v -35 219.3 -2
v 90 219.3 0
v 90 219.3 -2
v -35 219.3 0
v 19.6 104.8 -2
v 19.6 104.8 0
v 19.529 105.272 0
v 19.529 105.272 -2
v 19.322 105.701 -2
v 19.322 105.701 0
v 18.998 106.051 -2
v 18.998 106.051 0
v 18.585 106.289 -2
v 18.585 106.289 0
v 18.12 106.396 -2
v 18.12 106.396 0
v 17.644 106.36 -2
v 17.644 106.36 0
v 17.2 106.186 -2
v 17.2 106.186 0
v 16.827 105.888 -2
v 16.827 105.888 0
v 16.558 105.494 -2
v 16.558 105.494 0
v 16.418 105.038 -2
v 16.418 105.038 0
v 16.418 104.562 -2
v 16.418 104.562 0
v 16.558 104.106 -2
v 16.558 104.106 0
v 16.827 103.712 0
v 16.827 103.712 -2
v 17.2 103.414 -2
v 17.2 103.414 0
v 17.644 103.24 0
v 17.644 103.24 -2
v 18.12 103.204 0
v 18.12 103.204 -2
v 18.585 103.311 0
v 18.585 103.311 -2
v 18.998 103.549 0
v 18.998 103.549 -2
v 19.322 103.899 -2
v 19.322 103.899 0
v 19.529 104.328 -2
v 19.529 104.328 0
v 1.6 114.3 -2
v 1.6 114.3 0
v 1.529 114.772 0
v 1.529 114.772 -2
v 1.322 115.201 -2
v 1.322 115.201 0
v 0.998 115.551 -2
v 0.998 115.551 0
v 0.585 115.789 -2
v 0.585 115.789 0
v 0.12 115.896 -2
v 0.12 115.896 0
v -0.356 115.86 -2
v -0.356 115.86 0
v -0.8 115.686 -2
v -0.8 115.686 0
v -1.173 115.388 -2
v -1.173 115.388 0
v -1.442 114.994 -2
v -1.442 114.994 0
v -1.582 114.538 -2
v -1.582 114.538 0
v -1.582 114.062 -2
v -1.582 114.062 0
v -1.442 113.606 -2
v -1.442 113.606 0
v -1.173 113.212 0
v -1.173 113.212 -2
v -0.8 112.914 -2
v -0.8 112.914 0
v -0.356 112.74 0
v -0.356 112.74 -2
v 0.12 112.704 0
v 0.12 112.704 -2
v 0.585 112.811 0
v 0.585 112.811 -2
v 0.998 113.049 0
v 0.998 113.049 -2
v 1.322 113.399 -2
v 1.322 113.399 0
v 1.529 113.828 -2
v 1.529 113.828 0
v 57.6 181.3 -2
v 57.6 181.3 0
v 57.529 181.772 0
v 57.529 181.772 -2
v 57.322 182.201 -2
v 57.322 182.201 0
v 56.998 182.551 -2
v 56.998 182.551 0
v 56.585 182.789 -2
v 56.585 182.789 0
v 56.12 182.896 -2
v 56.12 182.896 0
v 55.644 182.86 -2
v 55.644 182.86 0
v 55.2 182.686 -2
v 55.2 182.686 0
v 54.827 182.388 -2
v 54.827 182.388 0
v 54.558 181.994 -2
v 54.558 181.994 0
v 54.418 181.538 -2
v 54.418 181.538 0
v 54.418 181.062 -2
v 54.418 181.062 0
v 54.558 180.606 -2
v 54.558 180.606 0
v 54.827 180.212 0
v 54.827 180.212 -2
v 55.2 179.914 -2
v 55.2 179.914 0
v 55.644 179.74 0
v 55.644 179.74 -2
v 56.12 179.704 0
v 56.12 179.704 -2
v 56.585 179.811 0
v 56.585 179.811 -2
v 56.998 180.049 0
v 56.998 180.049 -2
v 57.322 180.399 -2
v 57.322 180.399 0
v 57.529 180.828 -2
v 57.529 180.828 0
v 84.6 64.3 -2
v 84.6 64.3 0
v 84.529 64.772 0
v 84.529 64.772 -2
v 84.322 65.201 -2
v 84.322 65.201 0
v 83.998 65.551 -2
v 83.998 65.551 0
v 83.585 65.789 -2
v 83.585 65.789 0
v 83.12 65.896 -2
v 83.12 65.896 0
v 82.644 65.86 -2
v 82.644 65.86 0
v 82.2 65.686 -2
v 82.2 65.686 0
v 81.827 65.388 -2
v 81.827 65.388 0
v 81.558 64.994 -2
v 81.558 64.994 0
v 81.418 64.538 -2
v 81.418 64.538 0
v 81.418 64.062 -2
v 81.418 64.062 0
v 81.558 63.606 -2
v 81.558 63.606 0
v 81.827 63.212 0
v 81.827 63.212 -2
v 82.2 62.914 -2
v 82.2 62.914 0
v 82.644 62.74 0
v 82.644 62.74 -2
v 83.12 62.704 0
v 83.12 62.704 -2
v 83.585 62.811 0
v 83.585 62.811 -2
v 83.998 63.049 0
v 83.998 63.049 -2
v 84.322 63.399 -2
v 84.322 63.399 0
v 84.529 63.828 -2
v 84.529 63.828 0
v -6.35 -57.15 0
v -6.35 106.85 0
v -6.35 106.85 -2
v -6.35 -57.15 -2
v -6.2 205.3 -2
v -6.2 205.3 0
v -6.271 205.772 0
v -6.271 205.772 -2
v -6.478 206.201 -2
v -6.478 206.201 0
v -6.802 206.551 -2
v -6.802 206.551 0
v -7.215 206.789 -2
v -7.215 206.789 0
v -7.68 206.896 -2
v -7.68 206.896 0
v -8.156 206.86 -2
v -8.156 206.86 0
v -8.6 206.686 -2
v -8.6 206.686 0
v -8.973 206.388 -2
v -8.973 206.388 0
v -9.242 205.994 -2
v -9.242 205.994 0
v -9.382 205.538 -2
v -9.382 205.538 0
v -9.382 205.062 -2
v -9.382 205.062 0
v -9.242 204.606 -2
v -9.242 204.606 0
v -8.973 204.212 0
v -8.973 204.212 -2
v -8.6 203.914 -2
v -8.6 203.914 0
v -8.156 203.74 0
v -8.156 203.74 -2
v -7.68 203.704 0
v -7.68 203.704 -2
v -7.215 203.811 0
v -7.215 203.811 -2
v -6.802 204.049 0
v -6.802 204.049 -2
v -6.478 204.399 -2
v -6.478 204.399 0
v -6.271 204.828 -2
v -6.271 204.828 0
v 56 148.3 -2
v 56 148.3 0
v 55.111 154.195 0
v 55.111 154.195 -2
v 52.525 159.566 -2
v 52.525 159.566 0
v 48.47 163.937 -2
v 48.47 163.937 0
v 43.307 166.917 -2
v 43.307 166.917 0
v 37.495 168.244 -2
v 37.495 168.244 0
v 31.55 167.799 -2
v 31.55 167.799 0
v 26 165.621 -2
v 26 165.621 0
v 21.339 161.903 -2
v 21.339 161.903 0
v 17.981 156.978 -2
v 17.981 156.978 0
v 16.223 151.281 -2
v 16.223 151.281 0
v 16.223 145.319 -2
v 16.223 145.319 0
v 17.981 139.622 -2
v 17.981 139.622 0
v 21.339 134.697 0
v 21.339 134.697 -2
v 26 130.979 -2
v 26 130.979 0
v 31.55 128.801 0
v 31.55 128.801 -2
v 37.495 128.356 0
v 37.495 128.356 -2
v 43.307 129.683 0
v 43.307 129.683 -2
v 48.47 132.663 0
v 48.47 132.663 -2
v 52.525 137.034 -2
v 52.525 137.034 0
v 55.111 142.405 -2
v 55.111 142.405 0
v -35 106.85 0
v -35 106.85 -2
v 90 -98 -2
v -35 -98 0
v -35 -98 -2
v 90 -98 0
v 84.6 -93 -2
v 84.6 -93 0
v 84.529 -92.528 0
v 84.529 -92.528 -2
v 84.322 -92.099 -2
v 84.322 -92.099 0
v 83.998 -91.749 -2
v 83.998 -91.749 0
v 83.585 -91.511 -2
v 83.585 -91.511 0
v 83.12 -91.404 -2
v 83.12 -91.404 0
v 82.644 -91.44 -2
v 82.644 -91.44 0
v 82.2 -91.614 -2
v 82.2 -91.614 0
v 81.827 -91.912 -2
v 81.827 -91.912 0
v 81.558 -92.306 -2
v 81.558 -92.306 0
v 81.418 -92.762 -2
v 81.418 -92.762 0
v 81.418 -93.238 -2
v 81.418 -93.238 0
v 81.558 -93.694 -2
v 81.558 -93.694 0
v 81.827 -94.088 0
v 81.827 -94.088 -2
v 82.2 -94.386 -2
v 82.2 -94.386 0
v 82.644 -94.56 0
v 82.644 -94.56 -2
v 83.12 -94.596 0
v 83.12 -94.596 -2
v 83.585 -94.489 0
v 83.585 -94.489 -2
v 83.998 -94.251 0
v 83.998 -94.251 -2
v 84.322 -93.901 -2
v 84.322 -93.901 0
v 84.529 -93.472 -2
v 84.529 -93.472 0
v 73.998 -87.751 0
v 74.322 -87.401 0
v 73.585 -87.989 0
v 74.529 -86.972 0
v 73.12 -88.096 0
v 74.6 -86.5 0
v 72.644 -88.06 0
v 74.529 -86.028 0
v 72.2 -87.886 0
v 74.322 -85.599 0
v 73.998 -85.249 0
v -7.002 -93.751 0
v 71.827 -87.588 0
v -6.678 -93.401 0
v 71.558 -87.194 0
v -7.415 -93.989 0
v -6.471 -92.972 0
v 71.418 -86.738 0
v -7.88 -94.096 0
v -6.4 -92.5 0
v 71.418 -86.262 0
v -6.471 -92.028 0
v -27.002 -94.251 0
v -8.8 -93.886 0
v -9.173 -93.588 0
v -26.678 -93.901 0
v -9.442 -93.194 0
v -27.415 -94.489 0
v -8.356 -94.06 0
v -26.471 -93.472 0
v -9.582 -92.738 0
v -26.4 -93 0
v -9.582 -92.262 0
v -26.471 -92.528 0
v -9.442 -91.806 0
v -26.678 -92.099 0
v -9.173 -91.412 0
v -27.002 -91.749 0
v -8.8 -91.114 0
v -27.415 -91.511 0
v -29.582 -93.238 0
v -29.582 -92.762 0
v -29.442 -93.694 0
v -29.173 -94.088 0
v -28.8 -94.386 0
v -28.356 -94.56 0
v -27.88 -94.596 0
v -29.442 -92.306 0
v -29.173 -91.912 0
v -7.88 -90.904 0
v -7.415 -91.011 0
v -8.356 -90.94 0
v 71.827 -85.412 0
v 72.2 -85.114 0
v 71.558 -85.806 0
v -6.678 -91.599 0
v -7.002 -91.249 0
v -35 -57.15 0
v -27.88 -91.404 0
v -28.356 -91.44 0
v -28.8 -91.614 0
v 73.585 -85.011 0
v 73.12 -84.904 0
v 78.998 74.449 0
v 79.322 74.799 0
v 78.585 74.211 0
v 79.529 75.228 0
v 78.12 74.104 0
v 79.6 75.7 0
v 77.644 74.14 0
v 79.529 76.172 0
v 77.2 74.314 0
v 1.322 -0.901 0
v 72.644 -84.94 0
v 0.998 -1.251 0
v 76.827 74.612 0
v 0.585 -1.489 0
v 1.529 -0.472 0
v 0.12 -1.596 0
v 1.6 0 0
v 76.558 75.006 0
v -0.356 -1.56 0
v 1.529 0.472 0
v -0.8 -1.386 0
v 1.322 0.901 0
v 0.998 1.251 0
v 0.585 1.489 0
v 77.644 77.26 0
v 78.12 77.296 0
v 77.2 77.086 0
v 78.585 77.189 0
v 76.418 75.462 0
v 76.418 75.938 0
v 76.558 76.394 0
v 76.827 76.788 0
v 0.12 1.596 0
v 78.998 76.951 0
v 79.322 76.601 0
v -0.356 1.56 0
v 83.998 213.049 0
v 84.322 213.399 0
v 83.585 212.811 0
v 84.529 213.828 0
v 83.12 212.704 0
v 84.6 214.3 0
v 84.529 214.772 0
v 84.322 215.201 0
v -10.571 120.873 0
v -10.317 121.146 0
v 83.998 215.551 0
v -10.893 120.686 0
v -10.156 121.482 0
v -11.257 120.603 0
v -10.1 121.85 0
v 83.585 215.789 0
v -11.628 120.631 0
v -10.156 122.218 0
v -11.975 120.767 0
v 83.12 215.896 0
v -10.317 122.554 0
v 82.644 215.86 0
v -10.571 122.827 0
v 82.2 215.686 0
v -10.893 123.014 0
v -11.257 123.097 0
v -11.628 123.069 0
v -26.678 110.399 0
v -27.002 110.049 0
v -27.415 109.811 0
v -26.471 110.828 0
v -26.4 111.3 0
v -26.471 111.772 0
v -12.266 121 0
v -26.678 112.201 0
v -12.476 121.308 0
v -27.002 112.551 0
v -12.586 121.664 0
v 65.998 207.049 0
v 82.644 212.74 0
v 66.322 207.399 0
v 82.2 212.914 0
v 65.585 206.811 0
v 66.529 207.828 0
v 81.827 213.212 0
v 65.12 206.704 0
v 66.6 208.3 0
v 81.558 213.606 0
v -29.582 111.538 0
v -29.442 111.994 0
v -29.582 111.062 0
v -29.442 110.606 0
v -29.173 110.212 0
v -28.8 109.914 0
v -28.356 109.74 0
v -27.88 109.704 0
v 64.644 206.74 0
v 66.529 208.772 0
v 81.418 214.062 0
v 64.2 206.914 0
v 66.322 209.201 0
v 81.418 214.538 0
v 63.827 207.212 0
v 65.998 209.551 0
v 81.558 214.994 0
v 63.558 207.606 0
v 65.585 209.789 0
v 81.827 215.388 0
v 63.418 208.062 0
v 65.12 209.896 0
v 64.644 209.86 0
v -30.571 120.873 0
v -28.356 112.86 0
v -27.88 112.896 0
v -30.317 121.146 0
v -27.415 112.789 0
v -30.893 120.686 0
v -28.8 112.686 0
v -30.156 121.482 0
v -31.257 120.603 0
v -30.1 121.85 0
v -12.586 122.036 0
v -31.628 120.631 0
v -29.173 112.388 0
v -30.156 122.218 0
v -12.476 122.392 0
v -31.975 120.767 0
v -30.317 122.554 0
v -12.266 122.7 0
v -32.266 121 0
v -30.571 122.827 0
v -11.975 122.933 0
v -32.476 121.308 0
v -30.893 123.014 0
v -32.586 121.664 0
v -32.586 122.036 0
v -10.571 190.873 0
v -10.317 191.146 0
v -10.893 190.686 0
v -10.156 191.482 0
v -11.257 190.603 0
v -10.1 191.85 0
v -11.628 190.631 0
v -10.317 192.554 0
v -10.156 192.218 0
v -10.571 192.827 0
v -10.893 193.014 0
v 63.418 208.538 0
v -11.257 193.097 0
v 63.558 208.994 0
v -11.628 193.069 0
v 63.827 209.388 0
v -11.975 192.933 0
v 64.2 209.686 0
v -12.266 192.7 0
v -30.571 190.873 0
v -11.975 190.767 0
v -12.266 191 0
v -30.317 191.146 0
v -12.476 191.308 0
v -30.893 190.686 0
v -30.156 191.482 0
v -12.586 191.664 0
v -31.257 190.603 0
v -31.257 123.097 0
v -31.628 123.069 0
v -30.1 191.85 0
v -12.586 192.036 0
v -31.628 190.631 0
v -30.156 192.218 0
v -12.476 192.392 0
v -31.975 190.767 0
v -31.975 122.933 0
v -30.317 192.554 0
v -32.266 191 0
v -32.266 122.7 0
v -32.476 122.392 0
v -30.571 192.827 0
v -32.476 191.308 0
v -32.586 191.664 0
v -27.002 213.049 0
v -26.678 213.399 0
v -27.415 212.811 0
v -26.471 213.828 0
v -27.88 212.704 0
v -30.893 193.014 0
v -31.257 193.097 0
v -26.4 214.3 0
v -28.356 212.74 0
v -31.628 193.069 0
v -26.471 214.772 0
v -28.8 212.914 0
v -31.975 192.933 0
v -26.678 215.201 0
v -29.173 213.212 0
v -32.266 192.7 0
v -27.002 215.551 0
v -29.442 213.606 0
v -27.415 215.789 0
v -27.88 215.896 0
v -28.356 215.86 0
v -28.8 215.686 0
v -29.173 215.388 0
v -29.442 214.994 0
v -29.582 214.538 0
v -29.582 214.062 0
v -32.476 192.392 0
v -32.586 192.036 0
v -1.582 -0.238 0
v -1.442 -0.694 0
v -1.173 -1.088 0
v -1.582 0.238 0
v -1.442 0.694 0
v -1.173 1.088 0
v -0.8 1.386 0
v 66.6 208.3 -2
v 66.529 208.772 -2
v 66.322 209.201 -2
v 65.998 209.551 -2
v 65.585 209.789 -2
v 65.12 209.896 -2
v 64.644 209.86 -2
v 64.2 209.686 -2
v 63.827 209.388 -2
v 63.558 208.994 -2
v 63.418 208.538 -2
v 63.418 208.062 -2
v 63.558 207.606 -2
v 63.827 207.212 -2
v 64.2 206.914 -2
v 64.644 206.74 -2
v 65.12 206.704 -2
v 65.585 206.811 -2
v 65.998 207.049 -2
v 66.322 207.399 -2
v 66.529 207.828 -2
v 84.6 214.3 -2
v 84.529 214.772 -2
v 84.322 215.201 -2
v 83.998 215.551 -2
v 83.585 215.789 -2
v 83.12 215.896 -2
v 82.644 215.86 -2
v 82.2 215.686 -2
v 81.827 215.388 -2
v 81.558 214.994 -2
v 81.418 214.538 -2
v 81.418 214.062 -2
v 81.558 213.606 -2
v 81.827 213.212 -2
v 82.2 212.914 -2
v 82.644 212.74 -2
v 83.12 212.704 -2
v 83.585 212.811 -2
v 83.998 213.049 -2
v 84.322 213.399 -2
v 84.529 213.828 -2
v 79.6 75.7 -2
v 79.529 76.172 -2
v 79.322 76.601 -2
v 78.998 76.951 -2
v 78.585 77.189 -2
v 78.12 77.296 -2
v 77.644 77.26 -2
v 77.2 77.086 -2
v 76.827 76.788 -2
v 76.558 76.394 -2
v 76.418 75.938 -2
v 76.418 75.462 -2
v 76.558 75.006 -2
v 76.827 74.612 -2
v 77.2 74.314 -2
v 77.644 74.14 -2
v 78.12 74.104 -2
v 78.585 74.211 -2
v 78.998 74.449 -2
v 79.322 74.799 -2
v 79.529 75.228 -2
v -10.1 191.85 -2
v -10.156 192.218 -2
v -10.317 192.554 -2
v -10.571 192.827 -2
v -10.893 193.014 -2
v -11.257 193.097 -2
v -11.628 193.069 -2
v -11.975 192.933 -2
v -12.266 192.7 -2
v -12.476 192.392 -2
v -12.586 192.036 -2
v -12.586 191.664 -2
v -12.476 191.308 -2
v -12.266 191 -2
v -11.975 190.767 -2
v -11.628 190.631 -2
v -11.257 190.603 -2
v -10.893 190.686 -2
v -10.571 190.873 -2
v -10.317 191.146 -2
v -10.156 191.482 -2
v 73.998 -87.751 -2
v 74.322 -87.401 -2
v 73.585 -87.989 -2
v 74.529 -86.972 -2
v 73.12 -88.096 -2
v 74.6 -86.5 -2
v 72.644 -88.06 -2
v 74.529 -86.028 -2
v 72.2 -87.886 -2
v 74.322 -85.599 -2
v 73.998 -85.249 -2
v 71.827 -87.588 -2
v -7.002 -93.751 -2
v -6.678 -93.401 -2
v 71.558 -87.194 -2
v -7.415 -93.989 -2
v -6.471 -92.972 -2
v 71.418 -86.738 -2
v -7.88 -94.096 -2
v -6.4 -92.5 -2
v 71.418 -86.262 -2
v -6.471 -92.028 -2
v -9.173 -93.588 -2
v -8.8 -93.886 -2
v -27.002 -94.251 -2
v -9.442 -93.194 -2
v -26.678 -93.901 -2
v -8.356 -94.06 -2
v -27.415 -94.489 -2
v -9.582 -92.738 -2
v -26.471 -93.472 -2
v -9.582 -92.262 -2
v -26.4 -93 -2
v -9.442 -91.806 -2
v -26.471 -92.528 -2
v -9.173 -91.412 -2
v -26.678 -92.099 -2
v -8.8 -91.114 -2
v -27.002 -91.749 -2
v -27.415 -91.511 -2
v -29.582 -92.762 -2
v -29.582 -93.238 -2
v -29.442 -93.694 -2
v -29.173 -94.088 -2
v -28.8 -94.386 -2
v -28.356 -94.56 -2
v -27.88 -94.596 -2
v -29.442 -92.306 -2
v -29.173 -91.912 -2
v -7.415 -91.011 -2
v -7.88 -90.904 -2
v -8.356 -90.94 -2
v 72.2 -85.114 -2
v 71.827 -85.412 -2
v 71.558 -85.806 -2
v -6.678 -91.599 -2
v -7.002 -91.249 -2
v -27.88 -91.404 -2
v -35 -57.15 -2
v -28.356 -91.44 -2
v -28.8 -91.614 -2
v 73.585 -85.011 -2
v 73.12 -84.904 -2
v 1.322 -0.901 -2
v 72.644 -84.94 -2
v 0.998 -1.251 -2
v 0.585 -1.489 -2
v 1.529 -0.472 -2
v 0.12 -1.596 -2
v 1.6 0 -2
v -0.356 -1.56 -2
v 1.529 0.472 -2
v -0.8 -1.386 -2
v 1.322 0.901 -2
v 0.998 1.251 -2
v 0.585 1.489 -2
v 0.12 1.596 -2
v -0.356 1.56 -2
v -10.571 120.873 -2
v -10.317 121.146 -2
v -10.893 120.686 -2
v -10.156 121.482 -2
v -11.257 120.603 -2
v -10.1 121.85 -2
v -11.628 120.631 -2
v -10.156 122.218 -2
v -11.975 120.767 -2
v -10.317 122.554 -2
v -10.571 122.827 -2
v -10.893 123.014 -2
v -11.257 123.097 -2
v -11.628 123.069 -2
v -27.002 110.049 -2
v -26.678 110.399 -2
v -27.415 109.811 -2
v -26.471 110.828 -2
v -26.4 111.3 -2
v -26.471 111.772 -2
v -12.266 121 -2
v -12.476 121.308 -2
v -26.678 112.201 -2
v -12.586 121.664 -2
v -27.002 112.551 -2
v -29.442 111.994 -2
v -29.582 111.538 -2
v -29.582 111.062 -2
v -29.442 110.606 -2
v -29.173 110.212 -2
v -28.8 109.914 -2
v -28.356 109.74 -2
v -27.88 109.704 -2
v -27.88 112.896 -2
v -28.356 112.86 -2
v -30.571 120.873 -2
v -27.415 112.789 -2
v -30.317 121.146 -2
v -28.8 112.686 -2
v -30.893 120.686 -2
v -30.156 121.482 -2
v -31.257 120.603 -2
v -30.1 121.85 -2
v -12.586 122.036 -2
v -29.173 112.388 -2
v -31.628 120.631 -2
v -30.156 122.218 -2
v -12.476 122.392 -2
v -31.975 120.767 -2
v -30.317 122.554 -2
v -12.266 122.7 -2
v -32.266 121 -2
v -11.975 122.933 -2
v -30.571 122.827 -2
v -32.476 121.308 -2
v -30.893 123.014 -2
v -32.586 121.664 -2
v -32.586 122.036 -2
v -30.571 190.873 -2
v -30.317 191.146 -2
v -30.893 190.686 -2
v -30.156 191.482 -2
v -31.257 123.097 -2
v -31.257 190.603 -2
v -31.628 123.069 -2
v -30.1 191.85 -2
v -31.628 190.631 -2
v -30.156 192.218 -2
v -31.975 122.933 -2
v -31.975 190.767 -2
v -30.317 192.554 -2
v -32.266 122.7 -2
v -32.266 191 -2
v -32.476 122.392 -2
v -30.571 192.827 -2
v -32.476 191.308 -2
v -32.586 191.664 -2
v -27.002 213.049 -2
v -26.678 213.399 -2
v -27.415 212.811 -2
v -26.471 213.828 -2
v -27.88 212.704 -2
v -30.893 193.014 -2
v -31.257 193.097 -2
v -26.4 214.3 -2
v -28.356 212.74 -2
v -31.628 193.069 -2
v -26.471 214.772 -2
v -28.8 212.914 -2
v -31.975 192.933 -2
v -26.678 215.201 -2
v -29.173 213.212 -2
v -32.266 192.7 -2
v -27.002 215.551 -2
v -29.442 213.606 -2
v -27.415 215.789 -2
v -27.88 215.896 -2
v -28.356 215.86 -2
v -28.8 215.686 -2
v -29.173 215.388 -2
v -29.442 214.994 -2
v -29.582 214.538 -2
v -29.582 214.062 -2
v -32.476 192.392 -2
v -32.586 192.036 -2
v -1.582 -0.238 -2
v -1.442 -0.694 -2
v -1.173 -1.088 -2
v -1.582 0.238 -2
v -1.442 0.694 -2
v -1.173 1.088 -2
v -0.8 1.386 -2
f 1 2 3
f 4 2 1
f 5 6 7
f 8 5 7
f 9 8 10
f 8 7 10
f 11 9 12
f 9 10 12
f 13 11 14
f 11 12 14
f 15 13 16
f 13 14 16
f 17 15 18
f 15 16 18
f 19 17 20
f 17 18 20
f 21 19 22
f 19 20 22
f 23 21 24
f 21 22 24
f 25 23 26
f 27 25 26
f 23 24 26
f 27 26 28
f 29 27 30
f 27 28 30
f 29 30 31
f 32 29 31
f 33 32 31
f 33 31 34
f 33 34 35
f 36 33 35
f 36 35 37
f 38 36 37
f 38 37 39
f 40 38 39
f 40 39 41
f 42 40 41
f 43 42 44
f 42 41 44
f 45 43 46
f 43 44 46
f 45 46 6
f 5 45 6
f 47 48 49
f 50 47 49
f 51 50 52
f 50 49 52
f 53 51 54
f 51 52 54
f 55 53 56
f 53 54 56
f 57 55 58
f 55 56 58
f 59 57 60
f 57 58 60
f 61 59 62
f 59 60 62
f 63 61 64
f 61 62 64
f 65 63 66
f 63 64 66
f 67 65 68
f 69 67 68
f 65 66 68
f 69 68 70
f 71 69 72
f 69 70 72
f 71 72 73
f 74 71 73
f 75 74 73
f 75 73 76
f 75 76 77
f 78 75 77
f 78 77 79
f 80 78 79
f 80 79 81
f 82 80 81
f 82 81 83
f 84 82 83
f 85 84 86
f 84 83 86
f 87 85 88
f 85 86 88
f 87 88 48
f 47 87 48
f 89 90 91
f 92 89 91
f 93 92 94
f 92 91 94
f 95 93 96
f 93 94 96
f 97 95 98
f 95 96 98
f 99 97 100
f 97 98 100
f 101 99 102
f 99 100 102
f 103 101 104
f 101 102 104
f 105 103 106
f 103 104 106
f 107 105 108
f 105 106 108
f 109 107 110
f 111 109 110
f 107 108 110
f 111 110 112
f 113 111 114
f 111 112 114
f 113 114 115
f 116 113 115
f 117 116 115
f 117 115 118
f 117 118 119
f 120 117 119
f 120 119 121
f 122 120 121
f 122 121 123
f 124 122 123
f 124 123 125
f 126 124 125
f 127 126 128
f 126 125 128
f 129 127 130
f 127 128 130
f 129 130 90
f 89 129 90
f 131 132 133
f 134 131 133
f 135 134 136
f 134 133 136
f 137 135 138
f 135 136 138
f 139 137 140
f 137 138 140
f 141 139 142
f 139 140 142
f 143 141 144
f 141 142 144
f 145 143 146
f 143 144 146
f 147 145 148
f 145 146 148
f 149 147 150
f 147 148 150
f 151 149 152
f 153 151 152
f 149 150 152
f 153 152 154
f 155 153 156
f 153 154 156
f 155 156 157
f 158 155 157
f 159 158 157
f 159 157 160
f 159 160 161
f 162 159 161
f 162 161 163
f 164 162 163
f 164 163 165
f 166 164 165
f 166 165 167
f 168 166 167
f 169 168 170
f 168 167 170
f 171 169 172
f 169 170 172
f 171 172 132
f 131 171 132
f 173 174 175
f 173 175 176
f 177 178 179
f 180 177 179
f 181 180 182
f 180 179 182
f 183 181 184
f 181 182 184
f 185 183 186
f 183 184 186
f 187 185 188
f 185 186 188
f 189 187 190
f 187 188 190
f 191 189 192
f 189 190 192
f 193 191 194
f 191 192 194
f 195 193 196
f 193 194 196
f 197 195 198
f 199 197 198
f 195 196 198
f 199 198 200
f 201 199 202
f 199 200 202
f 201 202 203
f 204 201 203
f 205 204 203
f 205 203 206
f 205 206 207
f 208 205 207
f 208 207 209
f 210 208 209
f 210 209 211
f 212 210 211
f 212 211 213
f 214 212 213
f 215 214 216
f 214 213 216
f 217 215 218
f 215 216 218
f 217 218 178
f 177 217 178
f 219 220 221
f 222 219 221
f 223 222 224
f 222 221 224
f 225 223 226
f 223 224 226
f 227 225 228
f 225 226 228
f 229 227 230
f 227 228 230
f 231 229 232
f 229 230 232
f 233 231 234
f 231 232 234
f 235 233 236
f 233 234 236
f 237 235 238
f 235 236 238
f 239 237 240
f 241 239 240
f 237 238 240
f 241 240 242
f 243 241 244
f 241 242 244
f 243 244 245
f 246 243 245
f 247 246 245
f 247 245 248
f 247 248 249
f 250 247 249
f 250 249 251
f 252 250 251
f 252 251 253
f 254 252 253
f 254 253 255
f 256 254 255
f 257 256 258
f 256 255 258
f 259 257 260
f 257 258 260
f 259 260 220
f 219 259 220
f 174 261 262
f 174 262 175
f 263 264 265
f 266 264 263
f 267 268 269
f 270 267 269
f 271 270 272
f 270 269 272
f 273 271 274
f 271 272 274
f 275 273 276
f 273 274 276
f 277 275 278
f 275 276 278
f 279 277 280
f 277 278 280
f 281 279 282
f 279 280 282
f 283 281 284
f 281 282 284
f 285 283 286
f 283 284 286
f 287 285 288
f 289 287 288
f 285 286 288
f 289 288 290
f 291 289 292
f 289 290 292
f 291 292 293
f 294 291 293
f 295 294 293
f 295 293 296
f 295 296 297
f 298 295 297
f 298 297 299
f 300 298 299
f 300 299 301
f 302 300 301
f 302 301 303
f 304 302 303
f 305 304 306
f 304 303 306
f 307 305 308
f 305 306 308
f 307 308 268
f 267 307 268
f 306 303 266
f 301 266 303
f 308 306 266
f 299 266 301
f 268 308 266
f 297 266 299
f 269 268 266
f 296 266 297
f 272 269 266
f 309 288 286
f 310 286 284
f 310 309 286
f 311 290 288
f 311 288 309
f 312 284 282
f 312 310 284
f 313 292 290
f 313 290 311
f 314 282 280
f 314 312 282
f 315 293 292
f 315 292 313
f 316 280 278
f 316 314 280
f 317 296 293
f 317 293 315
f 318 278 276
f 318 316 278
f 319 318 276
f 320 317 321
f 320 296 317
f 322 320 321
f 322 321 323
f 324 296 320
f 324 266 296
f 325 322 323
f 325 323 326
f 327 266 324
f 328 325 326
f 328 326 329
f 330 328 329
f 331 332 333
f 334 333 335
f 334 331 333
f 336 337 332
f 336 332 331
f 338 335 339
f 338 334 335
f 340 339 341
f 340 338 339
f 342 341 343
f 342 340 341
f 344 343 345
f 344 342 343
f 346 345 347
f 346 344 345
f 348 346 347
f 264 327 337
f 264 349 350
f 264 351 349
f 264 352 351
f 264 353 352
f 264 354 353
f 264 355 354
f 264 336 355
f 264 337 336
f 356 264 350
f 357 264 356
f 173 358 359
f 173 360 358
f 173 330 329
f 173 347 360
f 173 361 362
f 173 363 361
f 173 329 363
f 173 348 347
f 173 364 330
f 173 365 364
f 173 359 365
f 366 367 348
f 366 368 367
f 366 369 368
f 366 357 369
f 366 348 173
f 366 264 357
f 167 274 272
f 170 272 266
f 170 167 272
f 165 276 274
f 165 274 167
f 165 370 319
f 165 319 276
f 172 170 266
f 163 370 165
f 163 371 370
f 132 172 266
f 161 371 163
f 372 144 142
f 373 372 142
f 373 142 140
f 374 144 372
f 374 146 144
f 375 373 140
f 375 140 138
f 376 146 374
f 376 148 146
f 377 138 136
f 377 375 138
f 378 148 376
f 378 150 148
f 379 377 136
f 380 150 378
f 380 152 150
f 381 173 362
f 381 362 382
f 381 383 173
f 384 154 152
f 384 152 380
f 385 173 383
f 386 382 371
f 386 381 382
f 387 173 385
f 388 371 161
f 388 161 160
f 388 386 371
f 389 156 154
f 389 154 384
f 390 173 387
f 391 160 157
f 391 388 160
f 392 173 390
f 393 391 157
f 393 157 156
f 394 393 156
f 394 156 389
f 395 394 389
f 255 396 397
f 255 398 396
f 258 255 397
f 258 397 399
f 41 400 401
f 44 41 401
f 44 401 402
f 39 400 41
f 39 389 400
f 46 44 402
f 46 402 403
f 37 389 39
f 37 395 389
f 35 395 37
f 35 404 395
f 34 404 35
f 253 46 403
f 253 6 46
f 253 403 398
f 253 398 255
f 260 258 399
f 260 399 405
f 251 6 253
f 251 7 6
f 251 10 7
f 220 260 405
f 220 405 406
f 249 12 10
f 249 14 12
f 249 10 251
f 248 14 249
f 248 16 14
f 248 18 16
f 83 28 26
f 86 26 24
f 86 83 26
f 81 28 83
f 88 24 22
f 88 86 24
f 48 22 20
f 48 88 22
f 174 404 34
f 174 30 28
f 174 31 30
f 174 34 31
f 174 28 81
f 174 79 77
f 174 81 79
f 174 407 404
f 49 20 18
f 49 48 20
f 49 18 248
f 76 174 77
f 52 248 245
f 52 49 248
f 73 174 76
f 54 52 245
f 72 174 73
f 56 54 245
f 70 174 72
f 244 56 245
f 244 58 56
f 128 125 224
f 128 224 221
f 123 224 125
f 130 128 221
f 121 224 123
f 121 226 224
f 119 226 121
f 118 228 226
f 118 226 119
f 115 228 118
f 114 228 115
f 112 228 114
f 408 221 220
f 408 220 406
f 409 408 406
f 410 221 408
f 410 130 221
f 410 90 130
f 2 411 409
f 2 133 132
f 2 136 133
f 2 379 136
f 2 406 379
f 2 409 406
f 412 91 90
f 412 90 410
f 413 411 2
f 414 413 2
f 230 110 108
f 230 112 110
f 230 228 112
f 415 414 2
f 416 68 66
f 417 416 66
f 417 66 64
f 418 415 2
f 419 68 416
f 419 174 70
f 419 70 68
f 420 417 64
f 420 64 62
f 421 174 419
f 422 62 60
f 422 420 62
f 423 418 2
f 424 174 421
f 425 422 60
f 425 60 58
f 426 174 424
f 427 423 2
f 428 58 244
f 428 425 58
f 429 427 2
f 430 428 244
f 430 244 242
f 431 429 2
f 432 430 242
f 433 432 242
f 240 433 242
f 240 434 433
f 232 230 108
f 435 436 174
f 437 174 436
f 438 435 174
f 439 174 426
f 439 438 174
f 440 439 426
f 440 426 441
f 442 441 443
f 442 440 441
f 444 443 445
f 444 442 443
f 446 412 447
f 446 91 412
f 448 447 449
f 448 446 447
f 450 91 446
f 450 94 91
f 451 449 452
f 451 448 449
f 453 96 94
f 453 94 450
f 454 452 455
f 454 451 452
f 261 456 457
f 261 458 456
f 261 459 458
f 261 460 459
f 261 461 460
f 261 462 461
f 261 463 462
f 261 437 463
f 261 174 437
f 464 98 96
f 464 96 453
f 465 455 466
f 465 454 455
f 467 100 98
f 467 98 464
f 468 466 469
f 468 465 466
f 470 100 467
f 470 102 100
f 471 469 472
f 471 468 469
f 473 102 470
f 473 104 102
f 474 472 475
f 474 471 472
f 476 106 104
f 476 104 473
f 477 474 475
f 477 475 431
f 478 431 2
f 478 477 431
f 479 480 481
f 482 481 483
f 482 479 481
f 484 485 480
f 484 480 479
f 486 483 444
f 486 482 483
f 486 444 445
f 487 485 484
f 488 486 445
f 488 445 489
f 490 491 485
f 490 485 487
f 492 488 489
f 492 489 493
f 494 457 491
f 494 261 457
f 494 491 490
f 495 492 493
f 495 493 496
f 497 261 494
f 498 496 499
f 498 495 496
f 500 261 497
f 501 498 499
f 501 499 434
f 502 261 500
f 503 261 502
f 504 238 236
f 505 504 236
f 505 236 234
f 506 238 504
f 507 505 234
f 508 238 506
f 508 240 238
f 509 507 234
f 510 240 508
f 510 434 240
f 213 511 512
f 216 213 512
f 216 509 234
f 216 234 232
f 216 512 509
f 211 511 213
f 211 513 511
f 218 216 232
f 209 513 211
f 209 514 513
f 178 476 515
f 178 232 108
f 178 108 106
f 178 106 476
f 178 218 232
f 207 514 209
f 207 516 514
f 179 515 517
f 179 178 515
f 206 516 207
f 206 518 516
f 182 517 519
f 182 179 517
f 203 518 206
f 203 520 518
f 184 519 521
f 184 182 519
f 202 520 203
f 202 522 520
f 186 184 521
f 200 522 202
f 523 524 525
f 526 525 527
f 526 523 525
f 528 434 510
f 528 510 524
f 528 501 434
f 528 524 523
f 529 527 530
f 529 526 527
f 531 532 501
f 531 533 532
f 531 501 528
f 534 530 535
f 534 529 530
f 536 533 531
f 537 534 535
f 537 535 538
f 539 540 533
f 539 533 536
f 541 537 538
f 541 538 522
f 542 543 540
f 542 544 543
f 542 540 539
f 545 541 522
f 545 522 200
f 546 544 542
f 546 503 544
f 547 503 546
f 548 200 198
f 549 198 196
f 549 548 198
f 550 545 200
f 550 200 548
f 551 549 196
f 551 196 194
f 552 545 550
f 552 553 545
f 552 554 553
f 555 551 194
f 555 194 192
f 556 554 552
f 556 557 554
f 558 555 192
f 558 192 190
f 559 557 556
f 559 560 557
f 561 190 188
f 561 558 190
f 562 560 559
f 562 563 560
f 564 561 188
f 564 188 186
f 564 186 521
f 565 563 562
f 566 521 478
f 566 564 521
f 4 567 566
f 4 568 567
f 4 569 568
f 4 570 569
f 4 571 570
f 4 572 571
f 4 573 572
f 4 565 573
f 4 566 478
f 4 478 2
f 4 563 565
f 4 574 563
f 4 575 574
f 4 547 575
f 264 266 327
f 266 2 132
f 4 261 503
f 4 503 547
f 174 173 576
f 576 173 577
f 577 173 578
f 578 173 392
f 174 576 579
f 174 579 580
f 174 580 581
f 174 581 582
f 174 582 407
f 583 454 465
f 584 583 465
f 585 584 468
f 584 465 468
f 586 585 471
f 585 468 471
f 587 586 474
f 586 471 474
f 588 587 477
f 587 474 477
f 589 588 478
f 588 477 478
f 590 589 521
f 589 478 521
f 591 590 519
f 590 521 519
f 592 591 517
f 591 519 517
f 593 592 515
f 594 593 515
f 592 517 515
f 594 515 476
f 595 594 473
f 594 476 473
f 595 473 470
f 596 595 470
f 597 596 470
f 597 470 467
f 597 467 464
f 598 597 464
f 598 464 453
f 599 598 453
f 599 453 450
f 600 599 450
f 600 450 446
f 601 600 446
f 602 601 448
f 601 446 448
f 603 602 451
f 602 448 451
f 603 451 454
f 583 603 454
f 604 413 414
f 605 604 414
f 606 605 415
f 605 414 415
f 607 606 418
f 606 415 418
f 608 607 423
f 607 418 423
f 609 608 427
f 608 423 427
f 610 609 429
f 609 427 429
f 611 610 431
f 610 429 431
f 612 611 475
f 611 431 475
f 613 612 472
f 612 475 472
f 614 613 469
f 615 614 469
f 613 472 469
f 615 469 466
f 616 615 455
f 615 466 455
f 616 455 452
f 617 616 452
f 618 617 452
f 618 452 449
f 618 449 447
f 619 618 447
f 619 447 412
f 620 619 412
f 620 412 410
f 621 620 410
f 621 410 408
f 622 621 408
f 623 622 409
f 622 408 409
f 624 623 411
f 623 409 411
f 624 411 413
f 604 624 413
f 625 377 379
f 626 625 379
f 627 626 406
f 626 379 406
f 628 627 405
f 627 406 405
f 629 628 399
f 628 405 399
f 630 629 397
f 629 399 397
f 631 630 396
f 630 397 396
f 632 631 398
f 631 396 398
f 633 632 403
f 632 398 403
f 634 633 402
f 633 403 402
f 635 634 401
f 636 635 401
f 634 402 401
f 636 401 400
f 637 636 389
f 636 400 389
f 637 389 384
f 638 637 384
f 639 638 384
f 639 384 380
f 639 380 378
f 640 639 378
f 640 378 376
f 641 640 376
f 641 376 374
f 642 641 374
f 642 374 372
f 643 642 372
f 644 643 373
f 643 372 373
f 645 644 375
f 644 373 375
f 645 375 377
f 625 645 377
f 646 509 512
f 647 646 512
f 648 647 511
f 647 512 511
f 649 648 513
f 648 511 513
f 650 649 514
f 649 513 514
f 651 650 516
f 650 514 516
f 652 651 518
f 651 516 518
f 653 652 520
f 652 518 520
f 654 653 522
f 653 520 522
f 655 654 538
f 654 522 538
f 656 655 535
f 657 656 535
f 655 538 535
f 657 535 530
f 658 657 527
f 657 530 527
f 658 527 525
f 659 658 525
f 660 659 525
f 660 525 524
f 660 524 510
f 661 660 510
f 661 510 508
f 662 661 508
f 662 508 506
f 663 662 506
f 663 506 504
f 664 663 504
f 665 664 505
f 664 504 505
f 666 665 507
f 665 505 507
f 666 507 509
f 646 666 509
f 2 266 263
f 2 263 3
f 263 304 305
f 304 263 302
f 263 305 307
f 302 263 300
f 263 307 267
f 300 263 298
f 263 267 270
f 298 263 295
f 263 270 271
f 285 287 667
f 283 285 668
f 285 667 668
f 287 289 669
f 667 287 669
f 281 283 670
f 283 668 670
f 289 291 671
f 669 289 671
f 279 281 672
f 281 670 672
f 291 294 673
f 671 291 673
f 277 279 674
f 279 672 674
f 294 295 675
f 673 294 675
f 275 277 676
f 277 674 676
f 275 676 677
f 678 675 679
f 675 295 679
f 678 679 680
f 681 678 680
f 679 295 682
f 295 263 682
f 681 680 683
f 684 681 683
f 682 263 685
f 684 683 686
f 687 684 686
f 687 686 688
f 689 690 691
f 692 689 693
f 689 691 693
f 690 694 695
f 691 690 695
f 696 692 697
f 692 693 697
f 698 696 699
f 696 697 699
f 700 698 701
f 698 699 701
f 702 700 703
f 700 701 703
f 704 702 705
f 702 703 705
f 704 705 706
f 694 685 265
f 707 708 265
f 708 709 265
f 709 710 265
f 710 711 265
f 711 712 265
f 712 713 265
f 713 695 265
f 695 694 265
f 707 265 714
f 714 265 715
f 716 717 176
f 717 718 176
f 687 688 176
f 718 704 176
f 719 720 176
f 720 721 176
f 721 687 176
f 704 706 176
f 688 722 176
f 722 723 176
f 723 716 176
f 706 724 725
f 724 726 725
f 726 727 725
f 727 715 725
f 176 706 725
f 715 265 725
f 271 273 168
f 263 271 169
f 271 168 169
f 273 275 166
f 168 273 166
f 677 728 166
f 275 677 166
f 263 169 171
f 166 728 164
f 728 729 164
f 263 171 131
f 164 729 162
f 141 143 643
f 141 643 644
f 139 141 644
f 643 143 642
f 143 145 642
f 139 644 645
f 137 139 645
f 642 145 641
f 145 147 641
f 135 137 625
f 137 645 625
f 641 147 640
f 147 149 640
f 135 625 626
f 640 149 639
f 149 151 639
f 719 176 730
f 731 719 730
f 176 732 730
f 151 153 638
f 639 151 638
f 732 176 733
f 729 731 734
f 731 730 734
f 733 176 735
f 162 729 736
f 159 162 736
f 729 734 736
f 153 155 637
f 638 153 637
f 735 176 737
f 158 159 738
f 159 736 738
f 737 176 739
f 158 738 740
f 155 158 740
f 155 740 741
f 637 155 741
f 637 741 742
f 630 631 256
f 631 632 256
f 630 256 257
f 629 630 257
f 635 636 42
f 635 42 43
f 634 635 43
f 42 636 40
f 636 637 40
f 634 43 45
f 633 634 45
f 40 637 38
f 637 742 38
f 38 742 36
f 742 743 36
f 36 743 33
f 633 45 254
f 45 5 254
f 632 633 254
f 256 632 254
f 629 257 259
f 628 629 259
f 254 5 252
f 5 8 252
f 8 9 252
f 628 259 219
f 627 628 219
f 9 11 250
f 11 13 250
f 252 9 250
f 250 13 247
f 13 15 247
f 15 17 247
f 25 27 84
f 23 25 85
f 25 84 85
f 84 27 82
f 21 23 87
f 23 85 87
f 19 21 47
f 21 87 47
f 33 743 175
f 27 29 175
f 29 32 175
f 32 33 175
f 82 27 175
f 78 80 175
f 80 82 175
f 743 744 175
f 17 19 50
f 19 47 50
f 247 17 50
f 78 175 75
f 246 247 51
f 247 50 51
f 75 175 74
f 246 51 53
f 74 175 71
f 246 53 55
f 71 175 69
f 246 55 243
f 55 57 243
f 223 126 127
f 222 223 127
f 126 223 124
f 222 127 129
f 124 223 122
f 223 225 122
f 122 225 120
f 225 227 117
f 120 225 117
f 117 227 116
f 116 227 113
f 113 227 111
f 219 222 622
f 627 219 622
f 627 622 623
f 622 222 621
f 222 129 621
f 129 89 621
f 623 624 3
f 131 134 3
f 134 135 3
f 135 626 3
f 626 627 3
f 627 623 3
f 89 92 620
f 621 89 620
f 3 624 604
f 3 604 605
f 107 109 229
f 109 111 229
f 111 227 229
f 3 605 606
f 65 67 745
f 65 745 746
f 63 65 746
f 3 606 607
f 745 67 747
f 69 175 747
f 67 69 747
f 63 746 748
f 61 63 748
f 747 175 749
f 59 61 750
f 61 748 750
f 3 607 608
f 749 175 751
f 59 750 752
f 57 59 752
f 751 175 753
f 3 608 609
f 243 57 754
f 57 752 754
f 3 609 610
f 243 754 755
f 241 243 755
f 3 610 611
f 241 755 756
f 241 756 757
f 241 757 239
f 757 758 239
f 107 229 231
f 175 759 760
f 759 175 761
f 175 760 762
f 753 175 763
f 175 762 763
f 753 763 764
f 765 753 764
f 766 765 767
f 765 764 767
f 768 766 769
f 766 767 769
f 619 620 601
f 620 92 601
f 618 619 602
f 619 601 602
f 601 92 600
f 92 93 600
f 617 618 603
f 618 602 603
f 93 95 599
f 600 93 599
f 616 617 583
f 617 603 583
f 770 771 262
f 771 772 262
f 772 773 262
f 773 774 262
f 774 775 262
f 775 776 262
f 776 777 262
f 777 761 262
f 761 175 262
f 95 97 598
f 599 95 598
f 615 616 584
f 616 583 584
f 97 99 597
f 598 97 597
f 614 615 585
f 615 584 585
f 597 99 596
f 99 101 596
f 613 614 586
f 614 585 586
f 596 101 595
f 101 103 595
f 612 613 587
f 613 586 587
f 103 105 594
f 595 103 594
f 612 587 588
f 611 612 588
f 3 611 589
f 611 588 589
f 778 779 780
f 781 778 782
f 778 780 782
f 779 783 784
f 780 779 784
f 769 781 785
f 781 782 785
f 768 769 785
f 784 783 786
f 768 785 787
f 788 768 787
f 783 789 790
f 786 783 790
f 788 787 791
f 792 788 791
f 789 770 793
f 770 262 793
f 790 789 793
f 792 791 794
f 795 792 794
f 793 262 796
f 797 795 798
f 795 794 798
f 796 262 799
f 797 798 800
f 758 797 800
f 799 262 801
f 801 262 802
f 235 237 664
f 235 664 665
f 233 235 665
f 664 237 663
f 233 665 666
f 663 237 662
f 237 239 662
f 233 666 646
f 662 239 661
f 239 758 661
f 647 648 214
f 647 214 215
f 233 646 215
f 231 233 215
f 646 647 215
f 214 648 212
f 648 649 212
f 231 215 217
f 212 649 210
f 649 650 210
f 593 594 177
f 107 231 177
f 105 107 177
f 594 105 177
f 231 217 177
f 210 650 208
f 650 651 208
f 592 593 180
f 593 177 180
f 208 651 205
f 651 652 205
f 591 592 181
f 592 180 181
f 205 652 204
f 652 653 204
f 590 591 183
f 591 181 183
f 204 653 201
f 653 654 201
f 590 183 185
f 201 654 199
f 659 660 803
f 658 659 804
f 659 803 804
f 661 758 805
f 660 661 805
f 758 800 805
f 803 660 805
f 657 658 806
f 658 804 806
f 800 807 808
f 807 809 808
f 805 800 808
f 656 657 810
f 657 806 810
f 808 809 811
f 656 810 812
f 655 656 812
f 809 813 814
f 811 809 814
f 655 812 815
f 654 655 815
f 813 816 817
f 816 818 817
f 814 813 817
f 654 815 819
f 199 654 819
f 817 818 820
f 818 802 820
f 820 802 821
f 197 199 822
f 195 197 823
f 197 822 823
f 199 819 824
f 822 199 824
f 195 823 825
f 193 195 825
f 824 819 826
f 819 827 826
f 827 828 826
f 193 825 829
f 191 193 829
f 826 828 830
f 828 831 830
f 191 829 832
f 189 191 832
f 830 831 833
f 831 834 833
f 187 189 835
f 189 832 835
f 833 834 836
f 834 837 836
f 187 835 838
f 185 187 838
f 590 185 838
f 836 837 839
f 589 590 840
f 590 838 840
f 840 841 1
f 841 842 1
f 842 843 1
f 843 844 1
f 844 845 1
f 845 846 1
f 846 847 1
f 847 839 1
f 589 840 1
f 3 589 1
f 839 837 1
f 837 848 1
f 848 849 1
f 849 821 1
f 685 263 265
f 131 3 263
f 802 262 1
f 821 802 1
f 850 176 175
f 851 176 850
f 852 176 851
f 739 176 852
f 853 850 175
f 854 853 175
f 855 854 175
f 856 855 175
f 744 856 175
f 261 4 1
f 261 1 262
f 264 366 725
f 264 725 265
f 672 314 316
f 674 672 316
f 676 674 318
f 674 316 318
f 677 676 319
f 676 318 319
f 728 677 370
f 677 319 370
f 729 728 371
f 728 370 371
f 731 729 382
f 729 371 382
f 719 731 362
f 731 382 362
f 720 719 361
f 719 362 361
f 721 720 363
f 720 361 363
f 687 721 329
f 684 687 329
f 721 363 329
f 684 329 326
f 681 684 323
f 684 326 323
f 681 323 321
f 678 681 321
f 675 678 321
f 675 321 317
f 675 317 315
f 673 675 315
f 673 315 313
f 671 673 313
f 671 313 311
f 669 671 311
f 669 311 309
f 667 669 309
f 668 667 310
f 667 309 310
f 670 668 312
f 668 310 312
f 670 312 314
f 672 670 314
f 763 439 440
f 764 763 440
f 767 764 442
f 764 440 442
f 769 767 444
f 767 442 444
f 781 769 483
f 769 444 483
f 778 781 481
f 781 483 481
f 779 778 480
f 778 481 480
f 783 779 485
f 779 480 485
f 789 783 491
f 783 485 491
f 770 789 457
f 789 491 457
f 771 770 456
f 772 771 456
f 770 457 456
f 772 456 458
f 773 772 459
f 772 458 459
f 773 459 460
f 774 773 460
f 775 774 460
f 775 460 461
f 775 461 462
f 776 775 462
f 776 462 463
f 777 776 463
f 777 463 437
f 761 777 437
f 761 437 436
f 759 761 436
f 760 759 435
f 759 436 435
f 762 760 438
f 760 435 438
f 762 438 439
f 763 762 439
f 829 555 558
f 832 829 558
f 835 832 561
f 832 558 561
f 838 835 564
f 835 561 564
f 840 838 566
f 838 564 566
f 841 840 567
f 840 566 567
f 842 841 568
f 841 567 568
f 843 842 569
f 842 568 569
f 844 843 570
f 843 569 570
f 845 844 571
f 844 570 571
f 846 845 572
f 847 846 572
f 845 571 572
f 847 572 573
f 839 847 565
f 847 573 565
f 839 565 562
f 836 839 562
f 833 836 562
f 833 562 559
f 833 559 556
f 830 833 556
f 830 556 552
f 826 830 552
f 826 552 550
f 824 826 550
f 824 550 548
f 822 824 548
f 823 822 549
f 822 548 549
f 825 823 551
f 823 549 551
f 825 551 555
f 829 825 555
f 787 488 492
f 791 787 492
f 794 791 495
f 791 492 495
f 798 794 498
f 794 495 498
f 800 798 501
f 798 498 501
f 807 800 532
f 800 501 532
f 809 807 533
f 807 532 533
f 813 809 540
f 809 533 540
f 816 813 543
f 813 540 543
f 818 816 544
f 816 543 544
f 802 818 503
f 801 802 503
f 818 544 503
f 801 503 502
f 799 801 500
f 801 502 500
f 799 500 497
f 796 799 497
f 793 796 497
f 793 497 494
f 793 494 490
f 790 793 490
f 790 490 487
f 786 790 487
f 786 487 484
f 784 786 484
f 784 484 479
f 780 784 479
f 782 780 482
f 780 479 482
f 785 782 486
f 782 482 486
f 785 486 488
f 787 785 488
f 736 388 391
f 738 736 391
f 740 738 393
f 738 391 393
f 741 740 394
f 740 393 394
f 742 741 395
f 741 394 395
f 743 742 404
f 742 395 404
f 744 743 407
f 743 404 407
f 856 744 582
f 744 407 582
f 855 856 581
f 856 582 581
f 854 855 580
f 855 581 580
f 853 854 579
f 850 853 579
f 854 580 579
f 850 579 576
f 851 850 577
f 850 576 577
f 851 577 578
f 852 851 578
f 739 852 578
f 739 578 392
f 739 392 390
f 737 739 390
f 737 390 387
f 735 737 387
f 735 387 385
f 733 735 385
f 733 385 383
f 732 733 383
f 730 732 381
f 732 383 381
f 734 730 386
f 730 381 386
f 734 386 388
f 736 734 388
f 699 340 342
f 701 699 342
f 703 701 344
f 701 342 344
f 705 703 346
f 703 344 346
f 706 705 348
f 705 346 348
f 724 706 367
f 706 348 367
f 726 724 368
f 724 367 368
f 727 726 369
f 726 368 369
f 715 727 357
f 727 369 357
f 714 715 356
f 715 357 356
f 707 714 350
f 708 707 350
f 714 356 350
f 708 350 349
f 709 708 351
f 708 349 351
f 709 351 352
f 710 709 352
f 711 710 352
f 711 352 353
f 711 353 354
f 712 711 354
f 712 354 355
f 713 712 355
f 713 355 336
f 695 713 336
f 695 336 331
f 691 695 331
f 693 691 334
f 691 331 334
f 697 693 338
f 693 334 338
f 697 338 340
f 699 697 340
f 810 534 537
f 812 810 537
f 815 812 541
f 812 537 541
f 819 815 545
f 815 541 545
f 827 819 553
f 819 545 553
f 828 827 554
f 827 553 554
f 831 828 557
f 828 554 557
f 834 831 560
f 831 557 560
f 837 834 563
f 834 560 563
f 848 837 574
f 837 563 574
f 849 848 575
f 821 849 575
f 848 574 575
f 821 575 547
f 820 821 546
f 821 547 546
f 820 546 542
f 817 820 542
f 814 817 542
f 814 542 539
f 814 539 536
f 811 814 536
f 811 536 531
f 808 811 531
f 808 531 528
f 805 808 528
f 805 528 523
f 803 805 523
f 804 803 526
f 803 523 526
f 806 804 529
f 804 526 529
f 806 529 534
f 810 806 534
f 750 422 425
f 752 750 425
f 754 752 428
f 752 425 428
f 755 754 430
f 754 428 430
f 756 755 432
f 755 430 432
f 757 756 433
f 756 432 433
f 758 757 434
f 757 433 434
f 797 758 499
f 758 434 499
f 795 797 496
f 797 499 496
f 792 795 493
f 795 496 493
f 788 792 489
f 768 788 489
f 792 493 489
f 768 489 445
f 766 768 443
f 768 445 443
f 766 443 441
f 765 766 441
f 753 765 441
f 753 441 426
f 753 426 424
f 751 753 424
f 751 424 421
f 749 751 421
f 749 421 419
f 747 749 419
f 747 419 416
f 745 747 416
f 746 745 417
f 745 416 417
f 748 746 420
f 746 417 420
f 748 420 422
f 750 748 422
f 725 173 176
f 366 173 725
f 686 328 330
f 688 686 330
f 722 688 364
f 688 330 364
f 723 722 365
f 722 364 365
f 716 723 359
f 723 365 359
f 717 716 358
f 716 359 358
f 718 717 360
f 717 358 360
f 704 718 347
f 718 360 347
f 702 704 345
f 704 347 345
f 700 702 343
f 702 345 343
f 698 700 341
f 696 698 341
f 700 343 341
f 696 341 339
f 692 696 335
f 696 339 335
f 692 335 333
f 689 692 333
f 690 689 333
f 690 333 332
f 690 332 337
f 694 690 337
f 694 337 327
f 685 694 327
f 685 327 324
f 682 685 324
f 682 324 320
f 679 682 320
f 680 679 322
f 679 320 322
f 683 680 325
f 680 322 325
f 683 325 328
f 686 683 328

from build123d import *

# Parameters (mm, degrees)
SKETCH1_R           = 1.6
SKETCH1_R_2         = 20
SKETCH1_R_3         = 1.25
BOSS_EXTRUDE1_DEPTH = 2


with BuildPart() as part:
    # Sketch1 → Boss-Extrude1 (new body)
    with BuildSketch(Plane(origin=(0, 0, 0), x_dir=(0, 1, 0), z_dir=(0, 0, 1))):
        Polygon((-98, 35), (-98, -90), (219.3, -90), (219.3, 35), (106.85, 35), (106.85, 6.35), (-57.15, 6.35), (-57.15, 35), align=None)
        with Locations(Location((205.3, 7.8, 0), (0, 0, 270))):
            Circle(SKETCH1_R, mode=Mode.SUBTRACT)
        with Locations(Location((-92.5, 8, 0), (0, 0, 270))):
            Circle(SKETCH1_R, mode=Mode.SUBTRACT)
        with Locations(Location((-93, 28, 0), (0, 0, 270))):
            Circle(SKETCH1_R, mode=Mode.SUBTRACT)
        with Locations(Location((114.3, 0, 0), (0, 0, 270))):
            Circle(SKETCH1_R, mode=Mode.SUBTRACT)
        with Locations(Location((-93, -83, 0), (0, 0, 270))):
            Circle(SKETCH1_R, mode=Mode.SUBTRACT)
        with Locations(Location((-86.5, -73, 0), (0, 0, 270))):
            Circle(SKETCH1_R, mode=Mode.SUBTRACT)
        with Locations(Location((64.3, -83, 0), (0, 0, 270))):
            Circle(SKETCH1_R, mode=Mode.SUBTRACT)
        with Locations(Location((75.7, -78, 0), (0, 0, 270))):
            Circle(SKETCH1_R, mode=Mode.SUBTRACT)
        with Locations(Location((214.3, -83, 0), (0, 0, 270))):
            Circle(SKETCH1_R, mode=Mode.SUBTRACT)
        with Locations(Location((208.3, -65, 0), (0, 0, 270))):
            Circle(SKETCH1_R, mode=Mode.SUBTRACT)
        with Locations(Location((181.3, -56, 0), (0, 0, 270))):
            Circle(SKETCH1_R, mode=Mode.SUBTRACT)
        with Locations(Location((148.3, -36, 0), (0, 0, 270))):
            Circle(SKETCH1_R_2, mode=Mode.SUBTRACT)
        with Locations(Location((0, 0, 0), (0, 0, 270))):
            Circle(SKETCH1_R, mode=Mode.SUBTRACT)
        with Locations(Location((104.8, -18, 0), (0, 0, 270))):
            Circle(SKETCH1_R, mode=Mode.SUBTRACT)
        with Locations(Location((191.85, 31.35, 0), (0, 0, 270))):
            Circle(SKETCH1_R_3, mode=Mode.SUBTRACT)
        with Locations(Location((121.85, 11.35, 0), (0, 0, 270))):
            Circle(SKETCH1_R_3, mode=Mode.SUBTRACT)
        with Locations(Location((111.3, 28, 0), (0, 0, 270))):
            Circle(SKETCH1_R, mode=Mode.SUBTRACT)
        with Locations(Location((121.85, 31.35, 0), (0, 0, 270))):
            Circle(SKETCH1_R_3, mode=Mode.SUBTRACT)
        with Locations(Location((191.85, 11.35, 0), (0, 0, 270))):
            Circle(SKETCH1_R_3, mode=Mode.SUBTRACT)
        with Locations(Location((214.3, 28, 0), (0, 0, 270))):
            Circle(SKETCH1_R, mode=Mode.SUBTRACT)
    extrude(amount=-BOSS_EXTRUDE1_DEPTH)


solid = part.part
